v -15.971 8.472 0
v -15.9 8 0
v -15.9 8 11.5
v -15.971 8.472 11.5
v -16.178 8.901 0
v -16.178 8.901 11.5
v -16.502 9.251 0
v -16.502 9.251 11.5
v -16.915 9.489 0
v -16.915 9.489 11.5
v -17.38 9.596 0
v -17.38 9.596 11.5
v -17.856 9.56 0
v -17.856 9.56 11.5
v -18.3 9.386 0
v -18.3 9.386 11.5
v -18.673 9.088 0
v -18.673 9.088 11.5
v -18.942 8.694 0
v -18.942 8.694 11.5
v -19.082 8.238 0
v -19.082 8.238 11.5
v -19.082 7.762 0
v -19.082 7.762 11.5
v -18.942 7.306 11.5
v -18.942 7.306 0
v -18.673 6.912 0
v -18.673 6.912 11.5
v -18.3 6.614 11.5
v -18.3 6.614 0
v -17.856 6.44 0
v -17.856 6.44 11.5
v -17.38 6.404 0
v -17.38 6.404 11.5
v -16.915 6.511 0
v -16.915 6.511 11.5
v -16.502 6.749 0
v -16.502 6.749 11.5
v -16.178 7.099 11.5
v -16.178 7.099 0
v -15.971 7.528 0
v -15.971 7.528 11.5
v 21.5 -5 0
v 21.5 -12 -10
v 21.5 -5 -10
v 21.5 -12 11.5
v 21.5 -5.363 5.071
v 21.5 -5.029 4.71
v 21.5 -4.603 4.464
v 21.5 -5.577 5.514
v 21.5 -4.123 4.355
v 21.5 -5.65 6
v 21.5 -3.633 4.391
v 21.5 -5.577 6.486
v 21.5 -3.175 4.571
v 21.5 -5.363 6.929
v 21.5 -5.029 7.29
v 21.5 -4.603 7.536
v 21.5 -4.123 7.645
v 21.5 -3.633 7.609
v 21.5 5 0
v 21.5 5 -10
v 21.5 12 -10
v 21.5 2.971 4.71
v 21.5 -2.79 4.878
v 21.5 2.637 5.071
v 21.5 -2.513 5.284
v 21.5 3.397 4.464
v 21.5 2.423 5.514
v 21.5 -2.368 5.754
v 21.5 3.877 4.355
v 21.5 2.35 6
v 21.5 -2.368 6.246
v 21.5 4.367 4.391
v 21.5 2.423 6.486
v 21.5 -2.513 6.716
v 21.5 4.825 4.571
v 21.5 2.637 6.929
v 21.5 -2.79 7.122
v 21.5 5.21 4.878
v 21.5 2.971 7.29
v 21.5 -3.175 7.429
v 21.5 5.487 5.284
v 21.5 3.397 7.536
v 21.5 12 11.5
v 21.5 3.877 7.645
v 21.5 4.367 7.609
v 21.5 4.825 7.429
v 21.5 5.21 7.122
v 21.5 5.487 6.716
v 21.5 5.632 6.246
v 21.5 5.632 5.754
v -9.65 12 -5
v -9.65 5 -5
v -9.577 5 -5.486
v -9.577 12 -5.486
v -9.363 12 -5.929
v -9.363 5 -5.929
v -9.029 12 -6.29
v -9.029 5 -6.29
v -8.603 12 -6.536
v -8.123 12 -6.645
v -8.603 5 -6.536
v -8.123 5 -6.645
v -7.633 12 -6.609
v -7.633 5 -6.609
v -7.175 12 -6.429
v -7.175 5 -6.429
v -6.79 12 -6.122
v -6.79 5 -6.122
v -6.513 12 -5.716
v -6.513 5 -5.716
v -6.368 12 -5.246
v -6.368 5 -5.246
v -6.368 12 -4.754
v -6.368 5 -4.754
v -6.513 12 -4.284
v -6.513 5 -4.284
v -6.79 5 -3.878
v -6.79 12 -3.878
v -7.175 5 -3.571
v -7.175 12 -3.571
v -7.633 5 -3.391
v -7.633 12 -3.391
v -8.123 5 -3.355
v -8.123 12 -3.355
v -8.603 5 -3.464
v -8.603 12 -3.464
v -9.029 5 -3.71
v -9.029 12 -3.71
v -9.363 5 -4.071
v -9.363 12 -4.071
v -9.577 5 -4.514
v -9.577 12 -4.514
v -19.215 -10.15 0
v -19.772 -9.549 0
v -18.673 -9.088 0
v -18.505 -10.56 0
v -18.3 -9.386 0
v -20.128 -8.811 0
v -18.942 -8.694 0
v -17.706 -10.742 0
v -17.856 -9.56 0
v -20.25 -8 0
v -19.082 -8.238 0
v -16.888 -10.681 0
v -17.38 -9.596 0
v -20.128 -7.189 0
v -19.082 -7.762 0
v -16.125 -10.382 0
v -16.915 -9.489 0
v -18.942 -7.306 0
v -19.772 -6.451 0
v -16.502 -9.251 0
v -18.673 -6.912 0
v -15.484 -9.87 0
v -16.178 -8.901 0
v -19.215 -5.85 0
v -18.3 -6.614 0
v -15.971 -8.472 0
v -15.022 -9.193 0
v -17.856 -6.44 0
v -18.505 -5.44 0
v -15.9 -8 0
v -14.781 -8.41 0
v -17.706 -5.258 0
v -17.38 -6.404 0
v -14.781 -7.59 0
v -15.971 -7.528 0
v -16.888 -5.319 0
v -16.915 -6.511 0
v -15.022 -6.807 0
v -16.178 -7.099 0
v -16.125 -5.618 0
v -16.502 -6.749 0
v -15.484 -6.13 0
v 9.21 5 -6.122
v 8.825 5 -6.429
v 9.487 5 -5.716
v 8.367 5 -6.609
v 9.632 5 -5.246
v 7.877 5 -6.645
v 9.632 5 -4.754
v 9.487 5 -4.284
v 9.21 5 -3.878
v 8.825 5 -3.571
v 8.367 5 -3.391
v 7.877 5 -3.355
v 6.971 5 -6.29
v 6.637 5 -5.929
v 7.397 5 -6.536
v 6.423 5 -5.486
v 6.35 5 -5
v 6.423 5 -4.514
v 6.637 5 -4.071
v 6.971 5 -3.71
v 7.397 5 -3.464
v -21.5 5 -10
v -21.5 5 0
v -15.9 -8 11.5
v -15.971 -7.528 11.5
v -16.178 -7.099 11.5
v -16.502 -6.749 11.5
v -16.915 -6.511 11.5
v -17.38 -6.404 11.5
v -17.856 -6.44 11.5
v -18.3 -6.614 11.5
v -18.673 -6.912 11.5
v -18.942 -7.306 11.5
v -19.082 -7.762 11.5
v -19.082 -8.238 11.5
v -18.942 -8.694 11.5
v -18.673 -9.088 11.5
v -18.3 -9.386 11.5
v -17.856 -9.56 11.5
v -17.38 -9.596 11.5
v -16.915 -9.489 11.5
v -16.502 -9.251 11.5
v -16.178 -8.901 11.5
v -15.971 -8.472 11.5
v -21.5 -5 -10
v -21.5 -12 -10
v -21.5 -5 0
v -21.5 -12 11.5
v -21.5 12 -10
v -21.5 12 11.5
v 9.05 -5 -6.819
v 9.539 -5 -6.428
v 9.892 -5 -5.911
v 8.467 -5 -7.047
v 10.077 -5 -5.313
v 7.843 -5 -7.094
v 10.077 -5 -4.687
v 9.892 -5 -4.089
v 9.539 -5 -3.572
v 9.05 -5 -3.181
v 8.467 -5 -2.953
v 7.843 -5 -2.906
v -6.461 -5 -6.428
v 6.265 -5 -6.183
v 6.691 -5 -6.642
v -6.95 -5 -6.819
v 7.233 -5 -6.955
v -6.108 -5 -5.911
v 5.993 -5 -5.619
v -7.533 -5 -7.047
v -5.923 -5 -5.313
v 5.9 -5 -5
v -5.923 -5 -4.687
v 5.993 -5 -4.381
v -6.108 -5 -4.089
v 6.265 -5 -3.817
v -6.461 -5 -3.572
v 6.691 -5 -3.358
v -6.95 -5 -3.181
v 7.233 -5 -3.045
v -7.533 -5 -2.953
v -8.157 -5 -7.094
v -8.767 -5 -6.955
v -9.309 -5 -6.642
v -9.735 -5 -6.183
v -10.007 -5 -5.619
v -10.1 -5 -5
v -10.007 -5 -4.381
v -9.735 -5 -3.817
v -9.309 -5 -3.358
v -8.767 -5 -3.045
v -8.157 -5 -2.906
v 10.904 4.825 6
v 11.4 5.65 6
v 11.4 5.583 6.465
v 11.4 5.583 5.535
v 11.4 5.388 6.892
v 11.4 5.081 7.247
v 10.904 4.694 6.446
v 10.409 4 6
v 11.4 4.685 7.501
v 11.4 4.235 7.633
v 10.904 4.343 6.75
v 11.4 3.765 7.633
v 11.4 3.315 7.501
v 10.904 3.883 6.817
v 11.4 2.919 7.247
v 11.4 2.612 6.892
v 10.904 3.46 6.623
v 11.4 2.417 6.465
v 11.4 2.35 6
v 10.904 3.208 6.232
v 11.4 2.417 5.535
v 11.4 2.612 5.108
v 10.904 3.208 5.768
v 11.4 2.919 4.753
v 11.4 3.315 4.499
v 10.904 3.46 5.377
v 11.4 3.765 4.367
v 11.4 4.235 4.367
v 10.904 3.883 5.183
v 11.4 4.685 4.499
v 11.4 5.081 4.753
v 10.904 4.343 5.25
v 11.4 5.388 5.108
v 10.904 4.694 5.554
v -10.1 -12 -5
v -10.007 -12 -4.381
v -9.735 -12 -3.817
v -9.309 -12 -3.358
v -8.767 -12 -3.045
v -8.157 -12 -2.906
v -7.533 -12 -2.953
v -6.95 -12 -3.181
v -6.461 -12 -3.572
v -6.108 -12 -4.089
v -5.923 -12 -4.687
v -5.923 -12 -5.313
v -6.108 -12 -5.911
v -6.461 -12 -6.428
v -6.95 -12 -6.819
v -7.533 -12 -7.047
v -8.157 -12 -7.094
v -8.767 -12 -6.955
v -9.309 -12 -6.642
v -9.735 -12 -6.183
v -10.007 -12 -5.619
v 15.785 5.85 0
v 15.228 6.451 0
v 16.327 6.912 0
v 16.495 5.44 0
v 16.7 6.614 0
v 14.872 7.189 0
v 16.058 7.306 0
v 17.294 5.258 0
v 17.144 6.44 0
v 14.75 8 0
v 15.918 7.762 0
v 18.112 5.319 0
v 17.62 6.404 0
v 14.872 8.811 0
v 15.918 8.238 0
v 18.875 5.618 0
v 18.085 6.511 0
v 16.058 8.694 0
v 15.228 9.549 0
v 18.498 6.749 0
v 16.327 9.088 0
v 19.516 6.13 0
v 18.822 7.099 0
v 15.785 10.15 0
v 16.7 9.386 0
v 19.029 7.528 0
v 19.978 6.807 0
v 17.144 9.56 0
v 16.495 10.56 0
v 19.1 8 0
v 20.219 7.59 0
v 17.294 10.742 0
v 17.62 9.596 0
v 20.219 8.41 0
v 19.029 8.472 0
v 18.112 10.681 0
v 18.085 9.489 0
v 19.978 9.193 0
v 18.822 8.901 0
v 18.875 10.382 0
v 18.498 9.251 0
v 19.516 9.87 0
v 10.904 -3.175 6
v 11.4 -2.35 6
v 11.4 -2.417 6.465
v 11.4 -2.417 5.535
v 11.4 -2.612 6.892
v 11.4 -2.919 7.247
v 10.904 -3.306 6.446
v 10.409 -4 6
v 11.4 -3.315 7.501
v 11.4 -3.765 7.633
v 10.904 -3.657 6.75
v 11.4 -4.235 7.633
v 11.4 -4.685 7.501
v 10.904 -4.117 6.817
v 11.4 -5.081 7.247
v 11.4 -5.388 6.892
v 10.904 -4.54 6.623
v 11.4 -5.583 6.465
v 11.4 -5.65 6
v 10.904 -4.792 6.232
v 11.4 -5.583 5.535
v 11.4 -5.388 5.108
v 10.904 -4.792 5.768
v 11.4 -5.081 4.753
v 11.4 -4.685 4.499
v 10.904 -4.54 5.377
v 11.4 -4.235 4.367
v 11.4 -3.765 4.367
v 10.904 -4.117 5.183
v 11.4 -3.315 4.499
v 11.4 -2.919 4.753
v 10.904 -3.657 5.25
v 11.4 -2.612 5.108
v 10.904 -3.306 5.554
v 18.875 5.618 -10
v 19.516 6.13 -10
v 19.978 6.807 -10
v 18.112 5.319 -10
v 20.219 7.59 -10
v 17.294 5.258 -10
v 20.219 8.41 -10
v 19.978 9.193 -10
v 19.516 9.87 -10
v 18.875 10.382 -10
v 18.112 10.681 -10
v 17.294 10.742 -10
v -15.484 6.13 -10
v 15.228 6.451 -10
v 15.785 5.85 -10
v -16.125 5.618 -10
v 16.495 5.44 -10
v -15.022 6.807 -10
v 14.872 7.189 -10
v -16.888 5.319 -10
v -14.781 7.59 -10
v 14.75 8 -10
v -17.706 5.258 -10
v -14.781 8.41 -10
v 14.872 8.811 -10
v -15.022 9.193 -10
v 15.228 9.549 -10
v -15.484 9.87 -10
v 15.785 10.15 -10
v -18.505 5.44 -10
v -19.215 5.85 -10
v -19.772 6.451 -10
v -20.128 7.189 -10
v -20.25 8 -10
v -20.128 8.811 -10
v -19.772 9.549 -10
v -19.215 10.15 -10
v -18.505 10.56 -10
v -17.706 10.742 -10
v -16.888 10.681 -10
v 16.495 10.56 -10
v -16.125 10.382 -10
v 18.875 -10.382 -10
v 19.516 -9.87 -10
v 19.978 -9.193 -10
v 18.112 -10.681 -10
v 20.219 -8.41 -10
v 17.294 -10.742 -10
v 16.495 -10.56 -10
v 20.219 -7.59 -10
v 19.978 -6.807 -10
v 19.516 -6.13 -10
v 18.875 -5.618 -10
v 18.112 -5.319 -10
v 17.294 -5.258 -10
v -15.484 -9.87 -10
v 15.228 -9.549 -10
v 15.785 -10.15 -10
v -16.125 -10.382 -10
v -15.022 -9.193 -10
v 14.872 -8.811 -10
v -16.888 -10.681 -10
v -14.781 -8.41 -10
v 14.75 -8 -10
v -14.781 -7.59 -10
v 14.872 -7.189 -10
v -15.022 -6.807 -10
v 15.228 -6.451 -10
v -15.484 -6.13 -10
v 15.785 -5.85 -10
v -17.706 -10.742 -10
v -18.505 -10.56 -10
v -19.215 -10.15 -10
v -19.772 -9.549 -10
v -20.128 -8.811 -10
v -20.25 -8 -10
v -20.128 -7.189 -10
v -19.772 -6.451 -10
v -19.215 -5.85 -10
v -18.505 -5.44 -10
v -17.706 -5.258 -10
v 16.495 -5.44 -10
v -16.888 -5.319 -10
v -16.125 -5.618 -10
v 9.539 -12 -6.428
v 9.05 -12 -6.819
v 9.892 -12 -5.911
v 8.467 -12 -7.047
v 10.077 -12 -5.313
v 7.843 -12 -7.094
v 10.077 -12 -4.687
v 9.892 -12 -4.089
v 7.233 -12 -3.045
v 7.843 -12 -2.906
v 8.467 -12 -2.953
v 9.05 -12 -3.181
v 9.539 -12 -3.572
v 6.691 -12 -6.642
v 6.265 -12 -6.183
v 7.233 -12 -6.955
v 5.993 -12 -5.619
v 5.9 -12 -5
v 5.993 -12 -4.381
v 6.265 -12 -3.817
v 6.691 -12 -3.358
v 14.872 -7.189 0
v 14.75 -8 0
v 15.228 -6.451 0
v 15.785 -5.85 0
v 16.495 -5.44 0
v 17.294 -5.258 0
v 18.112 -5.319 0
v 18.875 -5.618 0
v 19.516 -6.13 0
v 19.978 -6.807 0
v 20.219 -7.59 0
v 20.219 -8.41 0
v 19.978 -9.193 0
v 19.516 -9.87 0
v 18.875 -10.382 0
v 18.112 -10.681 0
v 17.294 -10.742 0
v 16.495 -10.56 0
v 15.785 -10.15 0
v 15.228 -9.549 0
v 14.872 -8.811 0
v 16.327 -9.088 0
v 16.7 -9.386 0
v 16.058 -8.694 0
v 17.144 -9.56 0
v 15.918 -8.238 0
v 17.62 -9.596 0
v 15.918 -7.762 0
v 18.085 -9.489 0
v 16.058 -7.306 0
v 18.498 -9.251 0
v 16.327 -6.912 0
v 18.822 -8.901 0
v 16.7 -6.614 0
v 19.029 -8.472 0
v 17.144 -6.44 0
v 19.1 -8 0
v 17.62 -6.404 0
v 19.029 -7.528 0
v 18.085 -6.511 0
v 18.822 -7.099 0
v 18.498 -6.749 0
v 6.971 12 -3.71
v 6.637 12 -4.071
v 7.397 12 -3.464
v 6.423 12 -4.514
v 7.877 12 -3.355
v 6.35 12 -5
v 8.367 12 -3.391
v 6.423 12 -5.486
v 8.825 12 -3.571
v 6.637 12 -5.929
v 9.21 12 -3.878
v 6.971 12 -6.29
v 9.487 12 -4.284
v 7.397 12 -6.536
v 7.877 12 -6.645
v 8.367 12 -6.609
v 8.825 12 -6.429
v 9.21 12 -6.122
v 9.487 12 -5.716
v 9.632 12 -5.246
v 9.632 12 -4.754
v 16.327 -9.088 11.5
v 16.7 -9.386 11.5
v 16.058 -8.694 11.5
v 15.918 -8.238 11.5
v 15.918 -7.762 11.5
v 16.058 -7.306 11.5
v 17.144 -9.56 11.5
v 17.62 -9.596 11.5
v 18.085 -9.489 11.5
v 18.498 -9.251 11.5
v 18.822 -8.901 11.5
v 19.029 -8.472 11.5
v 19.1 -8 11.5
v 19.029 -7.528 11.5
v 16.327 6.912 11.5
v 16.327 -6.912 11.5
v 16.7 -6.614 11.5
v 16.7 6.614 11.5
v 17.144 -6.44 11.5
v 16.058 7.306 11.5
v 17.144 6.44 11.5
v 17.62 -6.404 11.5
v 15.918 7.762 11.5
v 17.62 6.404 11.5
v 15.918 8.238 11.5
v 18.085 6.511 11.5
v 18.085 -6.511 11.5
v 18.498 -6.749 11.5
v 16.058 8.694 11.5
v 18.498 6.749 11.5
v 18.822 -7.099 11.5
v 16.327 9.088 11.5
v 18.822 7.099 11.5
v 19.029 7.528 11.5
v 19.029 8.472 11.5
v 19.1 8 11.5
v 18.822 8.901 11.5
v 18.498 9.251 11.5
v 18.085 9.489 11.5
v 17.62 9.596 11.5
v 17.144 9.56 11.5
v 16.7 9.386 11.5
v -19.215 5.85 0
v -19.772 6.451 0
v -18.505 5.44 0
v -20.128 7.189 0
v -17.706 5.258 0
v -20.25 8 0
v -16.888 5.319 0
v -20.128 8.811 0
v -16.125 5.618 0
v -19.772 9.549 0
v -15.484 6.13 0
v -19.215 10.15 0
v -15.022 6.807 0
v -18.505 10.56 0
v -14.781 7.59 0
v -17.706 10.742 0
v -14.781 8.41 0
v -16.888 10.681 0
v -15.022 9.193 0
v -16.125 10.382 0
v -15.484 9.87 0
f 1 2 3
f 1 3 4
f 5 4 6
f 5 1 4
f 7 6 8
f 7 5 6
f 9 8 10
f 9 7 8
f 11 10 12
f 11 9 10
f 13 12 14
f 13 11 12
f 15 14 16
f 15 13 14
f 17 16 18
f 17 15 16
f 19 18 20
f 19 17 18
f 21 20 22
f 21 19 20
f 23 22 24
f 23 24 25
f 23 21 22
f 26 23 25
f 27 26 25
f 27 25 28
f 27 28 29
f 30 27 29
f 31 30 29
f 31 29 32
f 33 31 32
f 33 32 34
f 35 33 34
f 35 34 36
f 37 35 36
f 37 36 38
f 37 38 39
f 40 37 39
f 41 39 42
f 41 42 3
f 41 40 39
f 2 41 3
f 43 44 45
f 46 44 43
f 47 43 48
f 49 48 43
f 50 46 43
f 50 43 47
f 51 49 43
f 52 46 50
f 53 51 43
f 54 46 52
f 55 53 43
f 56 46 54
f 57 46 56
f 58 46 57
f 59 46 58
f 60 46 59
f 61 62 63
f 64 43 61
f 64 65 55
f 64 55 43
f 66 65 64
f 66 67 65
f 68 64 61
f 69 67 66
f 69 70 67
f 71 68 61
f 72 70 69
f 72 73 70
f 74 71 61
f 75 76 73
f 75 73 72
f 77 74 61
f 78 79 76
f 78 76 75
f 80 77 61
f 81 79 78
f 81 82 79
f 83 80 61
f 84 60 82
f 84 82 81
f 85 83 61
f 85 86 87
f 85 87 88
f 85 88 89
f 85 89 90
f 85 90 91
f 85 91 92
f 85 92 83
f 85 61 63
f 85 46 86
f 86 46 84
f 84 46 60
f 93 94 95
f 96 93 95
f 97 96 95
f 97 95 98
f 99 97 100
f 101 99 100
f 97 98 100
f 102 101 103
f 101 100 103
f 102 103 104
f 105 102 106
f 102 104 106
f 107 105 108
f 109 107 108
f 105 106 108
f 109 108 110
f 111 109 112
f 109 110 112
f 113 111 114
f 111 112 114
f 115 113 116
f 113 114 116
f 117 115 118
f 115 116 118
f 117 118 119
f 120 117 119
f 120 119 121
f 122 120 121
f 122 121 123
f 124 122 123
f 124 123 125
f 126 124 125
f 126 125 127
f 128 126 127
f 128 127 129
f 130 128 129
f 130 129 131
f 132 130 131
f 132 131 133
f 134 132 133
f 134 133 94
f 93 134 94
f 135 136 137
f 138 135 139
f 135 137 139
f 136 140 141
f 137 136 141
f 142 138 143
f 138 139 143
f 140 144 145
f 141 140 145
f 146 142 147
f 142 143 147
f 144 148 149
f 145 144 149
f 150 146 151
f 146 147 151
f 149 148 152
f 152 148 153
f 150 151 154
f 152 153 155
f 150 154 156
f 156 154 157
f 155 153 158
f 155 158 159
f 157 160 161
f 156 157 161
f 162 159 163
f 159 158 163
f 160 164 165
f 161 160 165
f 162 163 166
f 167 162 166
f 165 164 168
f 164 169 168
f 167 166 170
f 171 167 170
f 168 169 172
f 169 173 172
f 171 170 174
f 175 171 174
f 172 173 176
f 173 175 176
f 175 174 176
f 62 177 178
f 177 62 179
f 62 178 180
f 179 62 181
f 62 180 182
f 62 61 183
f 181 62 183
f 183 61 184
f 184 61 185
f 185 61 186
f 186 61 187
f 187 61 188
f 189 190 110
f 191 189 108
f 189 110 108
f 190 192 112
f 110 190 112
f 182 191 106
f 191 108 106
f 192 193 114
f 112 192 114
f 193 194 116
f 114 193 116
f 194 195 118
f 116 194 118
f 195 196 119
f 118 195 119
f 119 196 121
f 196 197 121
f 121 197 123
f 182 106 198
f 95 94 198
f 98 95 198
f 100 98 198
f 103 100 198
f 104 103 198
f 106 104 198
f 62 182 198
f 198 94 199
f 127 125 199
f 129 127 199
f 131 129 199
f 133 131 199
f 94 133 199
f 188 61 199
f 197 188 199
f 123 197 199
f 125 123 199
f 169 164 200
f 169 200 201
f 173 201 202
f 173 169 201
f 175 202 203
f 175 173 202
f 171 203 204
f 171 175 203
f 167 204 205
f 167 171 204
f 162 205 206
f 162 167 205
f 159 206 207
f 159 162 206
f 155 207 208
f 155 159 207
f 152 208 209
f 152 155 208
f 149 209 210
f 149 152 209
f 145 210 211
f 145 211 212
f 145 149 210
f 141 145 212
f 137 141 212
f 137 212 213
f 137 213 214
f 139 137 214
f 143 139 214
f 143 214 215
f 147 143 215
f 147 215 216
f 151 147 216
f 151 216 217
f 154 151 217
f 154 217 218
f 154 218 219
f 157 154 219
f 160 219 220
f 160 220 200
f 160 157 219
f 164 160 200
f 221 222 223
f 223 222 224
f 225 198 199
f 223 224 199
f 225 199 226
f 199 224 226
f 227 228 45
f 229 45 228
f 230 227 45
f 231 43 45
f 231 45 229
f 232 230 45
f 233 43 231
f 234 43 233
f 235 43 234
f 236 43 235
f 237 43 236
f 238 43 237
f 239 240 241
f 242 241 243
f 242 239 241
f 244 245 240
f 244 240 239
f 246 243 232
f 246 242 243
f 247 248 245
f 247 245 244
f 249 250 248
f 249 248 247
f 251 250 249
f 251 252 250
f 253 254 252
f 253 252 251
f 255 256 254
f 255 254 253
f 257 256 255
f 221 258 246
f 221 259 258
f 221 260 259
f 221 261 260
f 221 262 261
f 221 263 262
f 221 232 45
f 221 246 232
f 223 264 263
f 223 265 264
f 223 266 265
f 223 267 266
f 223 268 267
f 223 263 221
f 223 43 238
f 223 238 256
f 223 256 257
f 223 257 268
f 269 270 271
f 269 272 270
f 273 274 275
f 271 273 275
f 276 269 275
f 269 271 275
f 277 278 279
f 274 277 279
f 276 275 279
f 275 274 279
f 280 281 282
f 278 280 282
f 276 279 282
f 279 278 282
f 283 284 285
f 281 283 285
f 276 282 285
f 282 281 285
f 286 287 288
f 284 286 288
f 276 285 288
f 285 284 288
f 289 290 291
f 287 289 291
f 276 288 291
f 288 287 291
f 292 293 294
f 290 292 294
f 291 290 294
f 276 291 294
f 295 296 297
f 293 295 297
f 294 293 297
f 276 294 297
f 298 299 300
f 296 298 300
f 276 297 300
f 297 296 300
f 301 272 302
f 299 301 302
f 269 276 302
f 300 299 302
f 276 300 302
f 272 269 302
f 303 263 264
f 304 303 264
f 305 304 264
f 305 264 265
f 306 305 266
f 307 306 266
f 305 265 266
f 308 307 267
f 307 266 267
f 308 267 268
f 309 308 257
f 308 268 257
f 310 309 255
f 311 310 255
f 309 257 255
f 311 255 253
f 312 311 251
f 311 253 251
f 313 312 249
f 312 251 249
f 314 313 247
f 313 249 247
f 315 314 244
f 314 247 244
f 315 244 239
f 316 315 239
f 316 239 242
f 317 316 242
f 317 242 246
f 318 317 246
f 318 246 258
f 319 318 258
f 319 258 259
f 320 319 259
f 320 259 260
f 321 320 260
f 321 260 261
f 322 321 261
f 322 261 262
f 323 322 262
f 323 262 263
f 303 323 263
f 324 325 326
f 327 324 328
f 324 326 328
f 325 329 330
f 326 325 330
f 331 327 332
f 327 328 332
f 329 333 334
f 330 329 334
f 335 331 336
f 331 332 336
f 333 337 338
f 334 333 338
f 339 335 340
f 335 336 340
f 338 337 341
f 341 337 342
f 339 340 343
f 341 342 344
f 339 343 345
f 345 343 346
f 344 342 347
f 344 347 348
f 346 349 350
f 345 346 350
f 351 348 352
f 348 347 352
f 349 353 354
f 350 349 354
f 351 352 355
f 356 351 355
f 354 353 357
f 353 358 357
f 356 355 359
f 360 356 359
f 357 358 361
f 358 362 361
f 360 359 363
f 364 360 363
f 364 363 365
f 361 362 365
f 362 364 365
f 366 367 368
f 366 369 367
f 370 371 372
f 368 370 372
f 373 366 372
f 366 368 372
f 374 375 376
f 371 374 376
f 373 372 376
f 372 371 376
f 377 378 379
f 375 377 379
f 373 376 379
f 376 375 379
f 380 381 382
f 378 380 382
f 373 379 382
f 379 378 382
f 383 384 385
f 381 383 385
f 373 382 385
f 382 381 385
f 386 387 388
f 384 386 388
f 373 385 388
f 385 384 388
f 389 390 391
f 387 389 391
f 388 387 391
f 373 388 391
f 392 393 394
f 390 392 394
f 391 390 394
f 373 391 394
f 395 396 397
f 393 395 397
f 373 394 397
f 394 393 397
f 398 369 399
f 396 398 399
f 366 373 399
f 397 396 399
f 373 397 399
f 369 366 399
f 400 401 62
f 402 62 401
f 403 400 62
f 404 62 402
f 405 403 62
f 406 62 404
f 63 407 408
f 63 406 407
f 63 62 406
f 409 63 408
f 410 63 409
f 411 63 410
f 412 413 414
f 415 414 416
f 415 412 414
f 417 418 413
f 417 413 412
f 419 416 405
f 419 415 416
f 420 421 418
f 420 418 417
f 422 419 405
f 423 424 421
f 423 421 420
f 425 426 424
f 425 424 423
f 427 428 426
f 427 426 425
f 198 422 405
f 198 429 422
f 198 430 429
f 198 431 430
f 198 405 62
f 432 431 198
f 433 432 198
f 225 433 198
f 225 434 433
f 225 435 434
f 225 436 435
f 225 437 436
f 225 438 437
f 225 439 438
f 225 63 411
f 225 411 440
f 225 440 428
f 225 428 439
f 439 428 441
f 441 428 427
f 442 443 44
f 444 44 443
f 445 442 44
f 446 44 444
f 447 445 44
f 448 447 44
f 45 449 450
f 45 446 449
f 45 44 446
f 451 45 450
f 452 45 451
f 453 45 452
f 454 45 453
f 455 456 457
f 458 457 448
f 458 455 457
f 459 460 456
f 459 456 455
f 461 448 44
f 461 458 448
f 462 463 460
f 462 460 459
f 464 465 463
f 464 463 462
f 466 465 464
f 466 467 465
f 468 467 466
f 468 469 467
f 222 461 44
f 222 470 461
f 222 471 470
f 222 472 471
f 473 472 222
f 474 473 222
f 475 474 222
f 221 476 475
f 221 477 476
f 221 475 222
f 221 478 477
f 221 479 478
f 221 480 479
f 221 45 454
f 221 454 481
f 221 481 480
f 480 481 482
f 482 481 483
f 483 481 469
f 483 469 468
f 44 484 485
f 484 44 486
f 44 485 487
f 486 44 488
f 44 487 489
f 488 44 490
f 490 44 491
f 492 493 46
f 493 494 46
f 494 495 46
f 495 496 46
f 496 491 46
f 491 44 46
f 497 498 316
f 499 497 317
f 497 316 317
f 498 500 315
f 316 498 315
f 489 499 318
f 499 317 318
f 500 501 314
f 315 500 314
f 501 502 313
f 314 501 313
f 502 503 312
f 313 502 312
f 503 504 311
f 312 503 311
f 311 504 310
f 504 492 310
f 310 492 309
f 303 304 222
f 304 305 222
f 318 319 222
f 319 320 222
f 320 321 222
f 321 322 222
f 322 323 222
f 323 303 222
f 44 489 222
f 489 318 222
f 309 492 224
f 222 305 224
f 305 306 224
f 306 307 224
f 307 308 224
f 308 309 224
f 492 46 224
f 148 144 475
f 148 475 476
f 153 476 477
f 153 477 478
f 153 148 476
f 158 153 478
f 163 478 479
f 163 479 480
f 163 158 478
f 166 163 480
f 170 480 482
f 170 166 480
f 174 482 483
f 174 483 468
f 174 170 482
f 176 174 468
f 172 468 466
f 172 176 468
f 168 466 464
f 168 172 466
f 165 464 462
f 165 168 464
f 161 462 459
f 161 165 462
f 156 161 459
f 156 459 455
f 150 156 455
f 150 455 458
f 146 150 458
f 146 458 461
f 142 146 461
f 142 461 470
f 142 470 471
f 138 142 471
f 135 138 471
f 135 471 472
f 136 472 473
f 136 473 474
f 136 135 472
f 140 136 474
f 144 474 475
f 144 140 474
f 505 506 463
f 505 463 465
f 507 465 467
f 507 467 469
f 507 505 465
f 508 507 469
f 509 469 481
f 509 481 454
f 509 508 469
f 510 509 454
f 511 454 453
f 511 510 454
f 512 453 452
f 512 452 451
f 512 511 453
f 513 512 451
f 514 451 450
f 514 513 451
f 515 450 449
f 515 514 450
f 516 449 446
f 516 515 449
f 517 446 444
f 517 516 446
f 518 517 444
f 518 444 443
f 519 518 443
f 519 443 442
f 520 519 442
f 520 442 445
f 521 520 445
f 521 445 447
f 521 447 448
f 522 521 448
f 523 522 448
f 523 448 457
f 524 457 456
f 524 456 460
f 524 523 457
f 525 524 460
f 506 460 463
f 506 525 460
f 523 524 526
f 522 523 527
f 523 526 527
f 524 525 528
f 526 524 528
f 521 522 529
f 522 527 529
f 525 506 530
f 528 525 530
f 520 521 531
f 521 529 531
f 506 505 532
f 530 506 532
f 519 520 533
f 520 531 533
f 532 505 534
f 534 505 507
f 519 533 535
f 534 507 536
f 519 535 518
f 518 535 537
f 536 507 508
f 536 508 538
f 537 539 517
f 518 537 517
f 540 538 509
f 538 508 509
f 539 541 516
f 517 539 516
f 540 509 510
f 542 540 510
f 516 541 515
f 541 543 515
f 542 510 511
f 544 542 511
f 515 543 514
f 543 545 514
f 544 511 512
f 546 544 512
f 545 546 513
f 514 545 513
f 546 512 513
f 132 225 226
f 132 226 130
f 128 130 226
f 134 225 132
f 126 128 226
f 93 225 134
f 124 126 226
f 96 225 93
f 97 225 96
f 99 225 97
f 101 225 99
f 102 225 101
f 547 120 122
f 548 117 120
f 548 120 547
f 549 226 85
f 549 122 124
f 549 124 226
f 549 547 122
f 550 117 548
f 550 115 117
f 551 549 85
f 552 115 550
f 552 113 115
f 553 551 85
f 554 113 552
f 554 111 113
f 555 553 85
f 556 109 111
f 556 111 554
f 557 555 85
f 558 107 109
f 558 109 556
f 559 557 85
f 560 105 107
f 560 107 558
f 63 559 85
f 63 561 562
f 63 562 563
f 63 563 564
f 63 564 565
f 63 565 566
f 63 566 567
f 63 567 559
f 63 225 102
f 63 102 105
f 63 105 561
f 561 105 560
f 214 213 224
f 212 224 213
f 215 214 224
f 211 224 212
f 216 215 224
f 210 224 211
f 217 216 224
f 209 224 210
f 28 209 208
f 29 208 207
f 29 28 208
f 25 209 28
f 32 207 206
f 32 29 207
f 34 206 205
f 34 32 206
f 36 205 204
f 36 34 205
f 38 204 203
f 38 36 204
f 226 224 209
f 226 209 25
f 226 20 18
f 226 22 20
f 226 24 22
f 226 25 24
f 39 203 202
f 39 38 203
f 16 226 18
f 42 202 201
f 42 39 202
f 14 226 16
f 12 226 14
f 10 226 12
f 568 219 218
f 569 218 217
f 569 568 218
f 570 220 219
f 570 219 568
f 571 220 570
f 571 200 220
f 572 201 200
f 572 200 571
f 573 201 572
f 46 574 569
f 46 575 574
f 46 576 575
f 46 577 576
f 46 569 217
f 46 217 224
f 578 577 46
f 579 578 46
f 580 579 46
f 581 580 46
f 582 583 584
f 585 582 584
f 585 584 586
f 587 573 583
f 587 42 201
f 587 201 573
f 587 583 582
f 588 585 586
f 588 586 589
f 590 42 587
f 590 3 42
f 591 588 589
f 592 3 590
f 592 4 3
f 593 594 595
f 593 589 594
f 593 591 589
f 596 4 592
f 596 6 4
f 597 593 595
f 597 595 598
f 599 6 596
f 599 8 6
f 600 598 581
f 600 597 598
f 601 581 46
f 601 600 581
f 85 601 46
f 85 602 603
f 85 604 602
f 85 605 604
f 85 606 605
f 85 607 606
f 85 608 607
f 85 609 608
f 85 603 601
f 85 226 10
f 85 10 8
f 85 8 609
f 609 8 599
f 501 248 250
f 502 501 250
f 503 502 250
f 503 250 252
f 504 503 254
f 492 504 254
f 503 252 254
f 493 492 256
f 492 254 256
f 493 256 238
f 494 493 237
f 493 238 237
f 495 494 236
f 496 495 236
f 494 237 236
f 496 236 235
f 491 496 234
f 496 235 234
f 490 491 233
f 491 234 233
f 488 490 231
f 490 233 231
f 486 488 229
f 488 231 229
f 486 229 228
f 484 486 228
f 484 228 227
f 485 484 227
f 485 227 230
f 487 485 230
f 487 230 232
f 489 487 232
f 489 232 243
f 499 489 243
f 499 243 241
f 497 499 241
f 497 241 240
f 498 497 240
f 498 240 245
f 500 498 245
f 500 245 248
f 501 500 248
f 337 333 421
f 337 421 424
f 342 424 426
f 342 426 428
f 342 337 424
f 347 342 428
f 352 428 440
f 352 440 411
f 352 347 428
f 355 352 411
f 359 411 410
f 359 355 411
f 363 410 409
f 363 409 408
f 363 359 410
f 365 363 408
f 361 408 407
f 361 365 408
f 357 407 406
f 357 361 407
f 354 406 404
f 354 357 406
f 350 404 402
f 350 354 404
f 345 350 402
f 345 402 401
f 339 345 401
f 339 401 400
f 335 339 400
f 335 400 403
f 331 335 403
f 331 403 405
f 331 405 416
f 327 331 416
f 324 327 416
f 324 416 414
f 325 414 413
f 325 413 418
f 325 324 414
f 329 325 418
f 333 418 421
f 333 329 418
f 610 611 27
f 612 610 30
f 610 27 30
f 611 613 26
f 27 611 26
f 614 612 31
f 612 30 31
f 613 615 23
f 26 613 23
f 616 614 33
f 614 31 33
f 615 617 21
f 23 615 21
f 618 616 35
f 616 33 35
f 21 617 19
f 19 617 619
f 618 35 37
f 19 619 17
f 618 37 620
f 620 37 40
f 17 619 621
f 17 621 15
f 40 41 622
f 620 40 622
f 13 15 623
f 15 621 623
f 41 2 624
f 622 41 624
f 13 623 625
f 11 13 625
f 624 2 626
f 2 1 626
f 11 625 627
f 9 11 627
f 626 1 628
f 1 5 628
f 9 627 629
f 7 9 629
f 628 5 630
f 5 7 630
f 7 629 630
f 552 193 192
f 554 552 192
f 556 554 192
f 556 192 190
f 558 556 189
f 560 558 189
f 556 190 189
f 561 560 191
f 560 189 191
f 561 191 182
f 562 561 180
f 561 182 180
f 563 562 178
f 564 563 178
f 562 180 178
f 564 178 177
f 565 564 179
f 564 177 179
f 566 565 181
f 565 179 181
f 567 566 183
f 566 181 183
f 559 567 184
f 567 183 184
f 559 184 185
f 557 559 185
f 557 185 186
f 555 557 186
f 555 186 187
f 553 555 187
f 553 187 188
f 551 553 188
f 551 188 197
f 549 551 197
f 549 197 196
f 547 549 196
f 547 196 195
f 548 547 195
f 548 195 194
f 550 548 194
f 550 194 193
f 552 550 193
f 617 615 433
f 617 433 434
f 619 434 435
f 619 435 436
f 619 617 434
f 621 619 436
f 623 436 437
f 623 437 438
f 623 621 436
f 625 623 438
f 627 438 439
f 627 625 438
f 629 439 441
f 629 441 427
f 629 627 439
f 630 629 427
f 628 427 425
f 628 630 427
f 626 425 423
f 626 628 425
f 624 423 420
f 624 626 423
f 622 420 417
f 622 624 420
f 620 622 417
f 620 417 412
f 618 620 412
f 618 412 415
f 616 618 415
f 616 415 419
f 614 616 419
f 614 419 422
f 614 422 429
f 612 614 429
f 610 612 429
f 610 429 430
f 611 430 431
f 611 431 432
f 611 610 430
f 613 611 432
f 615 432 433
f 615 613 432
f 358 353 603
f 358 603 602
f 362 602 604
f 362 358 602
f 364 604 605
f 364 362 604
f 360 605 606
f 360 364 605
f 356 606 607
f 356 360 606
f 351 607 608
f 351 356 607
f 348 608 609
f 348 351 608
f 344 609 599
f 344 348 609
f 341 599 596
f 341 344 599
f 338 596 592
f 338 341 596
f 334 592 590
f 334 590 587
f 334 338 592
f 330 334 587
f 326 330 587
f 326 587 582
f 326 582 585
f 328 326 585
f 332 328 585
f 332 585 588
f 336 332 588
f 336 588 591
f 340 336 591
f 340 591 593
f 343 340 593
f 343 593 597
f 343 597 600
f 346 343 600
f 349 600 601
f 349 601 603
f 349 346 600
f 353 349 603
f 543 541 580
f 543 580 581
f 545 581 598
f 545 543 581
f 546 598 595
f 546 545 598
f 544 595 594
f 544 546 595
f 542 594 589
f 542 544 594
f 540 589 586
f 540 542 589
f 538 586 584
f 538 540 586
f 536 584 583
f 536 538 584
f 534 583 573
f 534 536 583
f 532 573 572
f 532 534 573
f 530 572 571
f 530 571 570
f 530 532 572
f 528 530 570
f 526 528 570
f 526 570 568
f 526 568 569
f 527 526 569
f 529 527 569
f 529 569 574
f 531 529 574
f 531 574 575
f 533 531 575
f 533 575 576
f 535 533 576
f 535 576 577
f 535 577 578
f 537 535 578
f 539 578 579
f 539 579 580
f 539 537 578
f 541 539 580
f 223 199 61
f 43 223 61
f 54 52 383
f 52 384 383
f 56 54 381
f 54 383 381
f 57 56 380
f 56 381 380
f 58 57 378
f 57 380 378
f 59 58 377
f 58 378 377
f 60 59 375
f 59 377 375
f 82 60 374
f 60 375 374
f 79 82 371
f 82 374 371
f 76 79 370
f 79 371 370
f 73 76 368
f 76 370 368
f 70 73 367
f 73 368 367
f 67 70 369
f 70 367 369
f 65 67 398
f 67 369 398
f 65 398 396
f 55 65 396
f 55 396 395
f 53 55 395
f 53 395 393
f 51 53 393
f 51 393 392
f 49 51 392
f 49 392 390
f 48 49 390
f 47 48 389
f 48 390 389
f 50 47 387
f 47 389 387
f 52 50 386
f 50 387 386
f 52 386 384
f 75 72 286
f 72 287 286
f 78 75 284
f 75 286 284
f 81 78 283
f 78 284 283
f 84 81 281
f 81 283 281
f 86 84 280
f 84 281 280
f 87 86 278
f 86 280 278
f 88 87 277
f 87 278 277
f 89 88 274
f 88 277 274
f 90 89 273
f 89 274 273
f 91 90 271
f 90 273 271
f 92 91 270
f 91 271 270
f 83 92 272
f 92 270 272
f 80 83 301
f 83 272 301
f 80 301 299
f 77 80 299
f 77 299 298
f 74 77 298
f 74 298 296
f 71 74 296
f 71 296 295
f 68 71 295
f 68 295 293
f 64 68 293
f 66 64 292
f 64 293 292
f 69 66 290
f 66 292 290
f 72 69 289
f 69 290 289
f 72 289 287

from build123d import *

# Parameters (mm, degrees)
SKETCH_1_W             = 43
SKETCH_1_H             = 24
SKETCH_1_R             = 1.6
EXTRUDE_1_DEPTH        = 11.5
SKETCH_3_W             = 43
SKETCH_3_H             = 7
SKETCH_3_R             = 2.75
EXTRUDE_2_DEPTH        = 10
CUT_EXTRUDE_START      = -15
SKETCH_4_R             = 2.1
CUT_EXTRUDE_1_DEPTH    = 10
HOLE_WIZARD_M4_1_D     = 3.3
HOLE_WIZARD_M4_1_DEPTH = 10.1
HOLE_WIZARD_M4_1_TIP   = 0.991420021
HOLE_WIZARD_M4_2_D     = 3.3
HOLE_WIZARD_M4_2_DEPTH = 10.1
HOLE_WIZARD_M4_2_TIP   = 0.991420021


with BuildPart() as part:
    # 草图1 → 凸台-拉伸1 (new body)
    with BuildSketch(Plane.XY):
        Rectangle(SKETCH_1_W, SKETCH_1_H)
        with Locations((-17.5, 8)):
            Circle(SKETCH_1_R, mode=Mode.SUBTRACT)
        with Locations((-17.5, -8)):
            Circle(SKETCH_1_R, mode=Mode.SUBTRACT)
        with Locations((17.5, -8)):
            Circle(SKETCH_1_R, mode=Mode.SUBTRACT)
        with Locations((17.5, 8)):
            Circle(SKETCH_1_R, mode=Mode.SUBTRACT)
    extrude(amount=EXTRUDE_1_DEPTH)

    # 草图3 → 凸台-拉伸2 (add)
    # profile 1 of 2: a face of its own
    with BuildSketch(Plane(origin=(0, 0, 0), x_dir=(-1, 0, 0), z_dir=(0, 0, -1))):
        with Locations((0, -8.5)):
            Rectangle(SKETCH_3_W, SKETCH_3_H)
        with Locations((-17.5, -8)):
            Circle(SKETCH_3_R, mode=Mode.SUBTRACT)
        with Locations((17.5, -8)):
            Circle(SKETCH_3_R, mode=Mode.SUBTRACT)
    # profile 2 of 2: a face of its own
    with BuildSketch(Plane(origin=(0, 0, 0), x_dir=(-1, 0, 0), z_dir=(0, 0, -1))):
        with Locations((0, 8.5)):
            Rectangle(SKETCH_3_W, SKETCH_3_H)
        with Locations((17.5, 8)):
            Circle(SKETCH_3_R, mode=Mode.SUBTRACT)
        with Locations((-17.5, 8)):
            Circle(SKETCH_3_R, mode=Mode.SUBTRACT)
    extrude(amount=EXTRUDE_2_DEPTH)

    # 草图4 → 切除-拉伸1 (cut)
    with BuildSketch(Plane(origin=(0, 12, 0), x_dir=(1, 0, 0), z_dir=(0, 1, 0)).offset(CUT_EXTRUDE_START)):
        with Locations(Location((8, 5, 0), (0, 0, 180))):
            Circle(SKETCH_4_R)
        with Locations(Location((-8, 5, 0), (0, 0, 180))):
            Circle(SKETCH_4_R)
    extrude(amount=-CUT_EXTRUDE_1_DEPTH, mode=Mode.SUBTRACT)

    # M4 螺纹孔1
    with Locations(Plane(origin=(0, 12, 0), x_dir=(1, 0, 0), z_dir=(0, 1, 0))):
        with Locations((-8, 5), (8, 5)):
            Hole(HOLE_WIZARD_M4_1_D / 2, depth=HOLE_WIZARD_M4_1_DEPTH)
            with Locations((0, 0, -(HOLE_WIZARD_M4_1_DEPTH + HOLE_WIZARD_M4_1_TIP / 2))):  # 118° drill point
                Cone(0, HOLE_WIZARD_M4_1_D / 2, HOLE_WIZARD_M4_1_TIP, mode=Mode.SUBTRACT)

    # M4 螺纹孔2
    with Locations(Plane(origin=(21.5, 4, 6), x_dir=(0, 1, 0), z_dir=(1, 0, 0))):
        with Locations((0, 0), (-8, 0)):
            Hole(HOLE_WIZARD_M4_2_D / 2, depth=HOLE_WIZARD_M4_2_DEPTH)
            with Locations((0, 0, -(HOLE_WIZARD_M4_2_DEPTH + HOLE_WIZARD_M4_2_TIP / 2))):  # 118° drill point
                Cone(0, HOLE_WIZARD_M4_2_D / 2, HOLE_WIZARD_M4_2_TIP, mode=Mode.SUBTRACT)


solid = part.part
